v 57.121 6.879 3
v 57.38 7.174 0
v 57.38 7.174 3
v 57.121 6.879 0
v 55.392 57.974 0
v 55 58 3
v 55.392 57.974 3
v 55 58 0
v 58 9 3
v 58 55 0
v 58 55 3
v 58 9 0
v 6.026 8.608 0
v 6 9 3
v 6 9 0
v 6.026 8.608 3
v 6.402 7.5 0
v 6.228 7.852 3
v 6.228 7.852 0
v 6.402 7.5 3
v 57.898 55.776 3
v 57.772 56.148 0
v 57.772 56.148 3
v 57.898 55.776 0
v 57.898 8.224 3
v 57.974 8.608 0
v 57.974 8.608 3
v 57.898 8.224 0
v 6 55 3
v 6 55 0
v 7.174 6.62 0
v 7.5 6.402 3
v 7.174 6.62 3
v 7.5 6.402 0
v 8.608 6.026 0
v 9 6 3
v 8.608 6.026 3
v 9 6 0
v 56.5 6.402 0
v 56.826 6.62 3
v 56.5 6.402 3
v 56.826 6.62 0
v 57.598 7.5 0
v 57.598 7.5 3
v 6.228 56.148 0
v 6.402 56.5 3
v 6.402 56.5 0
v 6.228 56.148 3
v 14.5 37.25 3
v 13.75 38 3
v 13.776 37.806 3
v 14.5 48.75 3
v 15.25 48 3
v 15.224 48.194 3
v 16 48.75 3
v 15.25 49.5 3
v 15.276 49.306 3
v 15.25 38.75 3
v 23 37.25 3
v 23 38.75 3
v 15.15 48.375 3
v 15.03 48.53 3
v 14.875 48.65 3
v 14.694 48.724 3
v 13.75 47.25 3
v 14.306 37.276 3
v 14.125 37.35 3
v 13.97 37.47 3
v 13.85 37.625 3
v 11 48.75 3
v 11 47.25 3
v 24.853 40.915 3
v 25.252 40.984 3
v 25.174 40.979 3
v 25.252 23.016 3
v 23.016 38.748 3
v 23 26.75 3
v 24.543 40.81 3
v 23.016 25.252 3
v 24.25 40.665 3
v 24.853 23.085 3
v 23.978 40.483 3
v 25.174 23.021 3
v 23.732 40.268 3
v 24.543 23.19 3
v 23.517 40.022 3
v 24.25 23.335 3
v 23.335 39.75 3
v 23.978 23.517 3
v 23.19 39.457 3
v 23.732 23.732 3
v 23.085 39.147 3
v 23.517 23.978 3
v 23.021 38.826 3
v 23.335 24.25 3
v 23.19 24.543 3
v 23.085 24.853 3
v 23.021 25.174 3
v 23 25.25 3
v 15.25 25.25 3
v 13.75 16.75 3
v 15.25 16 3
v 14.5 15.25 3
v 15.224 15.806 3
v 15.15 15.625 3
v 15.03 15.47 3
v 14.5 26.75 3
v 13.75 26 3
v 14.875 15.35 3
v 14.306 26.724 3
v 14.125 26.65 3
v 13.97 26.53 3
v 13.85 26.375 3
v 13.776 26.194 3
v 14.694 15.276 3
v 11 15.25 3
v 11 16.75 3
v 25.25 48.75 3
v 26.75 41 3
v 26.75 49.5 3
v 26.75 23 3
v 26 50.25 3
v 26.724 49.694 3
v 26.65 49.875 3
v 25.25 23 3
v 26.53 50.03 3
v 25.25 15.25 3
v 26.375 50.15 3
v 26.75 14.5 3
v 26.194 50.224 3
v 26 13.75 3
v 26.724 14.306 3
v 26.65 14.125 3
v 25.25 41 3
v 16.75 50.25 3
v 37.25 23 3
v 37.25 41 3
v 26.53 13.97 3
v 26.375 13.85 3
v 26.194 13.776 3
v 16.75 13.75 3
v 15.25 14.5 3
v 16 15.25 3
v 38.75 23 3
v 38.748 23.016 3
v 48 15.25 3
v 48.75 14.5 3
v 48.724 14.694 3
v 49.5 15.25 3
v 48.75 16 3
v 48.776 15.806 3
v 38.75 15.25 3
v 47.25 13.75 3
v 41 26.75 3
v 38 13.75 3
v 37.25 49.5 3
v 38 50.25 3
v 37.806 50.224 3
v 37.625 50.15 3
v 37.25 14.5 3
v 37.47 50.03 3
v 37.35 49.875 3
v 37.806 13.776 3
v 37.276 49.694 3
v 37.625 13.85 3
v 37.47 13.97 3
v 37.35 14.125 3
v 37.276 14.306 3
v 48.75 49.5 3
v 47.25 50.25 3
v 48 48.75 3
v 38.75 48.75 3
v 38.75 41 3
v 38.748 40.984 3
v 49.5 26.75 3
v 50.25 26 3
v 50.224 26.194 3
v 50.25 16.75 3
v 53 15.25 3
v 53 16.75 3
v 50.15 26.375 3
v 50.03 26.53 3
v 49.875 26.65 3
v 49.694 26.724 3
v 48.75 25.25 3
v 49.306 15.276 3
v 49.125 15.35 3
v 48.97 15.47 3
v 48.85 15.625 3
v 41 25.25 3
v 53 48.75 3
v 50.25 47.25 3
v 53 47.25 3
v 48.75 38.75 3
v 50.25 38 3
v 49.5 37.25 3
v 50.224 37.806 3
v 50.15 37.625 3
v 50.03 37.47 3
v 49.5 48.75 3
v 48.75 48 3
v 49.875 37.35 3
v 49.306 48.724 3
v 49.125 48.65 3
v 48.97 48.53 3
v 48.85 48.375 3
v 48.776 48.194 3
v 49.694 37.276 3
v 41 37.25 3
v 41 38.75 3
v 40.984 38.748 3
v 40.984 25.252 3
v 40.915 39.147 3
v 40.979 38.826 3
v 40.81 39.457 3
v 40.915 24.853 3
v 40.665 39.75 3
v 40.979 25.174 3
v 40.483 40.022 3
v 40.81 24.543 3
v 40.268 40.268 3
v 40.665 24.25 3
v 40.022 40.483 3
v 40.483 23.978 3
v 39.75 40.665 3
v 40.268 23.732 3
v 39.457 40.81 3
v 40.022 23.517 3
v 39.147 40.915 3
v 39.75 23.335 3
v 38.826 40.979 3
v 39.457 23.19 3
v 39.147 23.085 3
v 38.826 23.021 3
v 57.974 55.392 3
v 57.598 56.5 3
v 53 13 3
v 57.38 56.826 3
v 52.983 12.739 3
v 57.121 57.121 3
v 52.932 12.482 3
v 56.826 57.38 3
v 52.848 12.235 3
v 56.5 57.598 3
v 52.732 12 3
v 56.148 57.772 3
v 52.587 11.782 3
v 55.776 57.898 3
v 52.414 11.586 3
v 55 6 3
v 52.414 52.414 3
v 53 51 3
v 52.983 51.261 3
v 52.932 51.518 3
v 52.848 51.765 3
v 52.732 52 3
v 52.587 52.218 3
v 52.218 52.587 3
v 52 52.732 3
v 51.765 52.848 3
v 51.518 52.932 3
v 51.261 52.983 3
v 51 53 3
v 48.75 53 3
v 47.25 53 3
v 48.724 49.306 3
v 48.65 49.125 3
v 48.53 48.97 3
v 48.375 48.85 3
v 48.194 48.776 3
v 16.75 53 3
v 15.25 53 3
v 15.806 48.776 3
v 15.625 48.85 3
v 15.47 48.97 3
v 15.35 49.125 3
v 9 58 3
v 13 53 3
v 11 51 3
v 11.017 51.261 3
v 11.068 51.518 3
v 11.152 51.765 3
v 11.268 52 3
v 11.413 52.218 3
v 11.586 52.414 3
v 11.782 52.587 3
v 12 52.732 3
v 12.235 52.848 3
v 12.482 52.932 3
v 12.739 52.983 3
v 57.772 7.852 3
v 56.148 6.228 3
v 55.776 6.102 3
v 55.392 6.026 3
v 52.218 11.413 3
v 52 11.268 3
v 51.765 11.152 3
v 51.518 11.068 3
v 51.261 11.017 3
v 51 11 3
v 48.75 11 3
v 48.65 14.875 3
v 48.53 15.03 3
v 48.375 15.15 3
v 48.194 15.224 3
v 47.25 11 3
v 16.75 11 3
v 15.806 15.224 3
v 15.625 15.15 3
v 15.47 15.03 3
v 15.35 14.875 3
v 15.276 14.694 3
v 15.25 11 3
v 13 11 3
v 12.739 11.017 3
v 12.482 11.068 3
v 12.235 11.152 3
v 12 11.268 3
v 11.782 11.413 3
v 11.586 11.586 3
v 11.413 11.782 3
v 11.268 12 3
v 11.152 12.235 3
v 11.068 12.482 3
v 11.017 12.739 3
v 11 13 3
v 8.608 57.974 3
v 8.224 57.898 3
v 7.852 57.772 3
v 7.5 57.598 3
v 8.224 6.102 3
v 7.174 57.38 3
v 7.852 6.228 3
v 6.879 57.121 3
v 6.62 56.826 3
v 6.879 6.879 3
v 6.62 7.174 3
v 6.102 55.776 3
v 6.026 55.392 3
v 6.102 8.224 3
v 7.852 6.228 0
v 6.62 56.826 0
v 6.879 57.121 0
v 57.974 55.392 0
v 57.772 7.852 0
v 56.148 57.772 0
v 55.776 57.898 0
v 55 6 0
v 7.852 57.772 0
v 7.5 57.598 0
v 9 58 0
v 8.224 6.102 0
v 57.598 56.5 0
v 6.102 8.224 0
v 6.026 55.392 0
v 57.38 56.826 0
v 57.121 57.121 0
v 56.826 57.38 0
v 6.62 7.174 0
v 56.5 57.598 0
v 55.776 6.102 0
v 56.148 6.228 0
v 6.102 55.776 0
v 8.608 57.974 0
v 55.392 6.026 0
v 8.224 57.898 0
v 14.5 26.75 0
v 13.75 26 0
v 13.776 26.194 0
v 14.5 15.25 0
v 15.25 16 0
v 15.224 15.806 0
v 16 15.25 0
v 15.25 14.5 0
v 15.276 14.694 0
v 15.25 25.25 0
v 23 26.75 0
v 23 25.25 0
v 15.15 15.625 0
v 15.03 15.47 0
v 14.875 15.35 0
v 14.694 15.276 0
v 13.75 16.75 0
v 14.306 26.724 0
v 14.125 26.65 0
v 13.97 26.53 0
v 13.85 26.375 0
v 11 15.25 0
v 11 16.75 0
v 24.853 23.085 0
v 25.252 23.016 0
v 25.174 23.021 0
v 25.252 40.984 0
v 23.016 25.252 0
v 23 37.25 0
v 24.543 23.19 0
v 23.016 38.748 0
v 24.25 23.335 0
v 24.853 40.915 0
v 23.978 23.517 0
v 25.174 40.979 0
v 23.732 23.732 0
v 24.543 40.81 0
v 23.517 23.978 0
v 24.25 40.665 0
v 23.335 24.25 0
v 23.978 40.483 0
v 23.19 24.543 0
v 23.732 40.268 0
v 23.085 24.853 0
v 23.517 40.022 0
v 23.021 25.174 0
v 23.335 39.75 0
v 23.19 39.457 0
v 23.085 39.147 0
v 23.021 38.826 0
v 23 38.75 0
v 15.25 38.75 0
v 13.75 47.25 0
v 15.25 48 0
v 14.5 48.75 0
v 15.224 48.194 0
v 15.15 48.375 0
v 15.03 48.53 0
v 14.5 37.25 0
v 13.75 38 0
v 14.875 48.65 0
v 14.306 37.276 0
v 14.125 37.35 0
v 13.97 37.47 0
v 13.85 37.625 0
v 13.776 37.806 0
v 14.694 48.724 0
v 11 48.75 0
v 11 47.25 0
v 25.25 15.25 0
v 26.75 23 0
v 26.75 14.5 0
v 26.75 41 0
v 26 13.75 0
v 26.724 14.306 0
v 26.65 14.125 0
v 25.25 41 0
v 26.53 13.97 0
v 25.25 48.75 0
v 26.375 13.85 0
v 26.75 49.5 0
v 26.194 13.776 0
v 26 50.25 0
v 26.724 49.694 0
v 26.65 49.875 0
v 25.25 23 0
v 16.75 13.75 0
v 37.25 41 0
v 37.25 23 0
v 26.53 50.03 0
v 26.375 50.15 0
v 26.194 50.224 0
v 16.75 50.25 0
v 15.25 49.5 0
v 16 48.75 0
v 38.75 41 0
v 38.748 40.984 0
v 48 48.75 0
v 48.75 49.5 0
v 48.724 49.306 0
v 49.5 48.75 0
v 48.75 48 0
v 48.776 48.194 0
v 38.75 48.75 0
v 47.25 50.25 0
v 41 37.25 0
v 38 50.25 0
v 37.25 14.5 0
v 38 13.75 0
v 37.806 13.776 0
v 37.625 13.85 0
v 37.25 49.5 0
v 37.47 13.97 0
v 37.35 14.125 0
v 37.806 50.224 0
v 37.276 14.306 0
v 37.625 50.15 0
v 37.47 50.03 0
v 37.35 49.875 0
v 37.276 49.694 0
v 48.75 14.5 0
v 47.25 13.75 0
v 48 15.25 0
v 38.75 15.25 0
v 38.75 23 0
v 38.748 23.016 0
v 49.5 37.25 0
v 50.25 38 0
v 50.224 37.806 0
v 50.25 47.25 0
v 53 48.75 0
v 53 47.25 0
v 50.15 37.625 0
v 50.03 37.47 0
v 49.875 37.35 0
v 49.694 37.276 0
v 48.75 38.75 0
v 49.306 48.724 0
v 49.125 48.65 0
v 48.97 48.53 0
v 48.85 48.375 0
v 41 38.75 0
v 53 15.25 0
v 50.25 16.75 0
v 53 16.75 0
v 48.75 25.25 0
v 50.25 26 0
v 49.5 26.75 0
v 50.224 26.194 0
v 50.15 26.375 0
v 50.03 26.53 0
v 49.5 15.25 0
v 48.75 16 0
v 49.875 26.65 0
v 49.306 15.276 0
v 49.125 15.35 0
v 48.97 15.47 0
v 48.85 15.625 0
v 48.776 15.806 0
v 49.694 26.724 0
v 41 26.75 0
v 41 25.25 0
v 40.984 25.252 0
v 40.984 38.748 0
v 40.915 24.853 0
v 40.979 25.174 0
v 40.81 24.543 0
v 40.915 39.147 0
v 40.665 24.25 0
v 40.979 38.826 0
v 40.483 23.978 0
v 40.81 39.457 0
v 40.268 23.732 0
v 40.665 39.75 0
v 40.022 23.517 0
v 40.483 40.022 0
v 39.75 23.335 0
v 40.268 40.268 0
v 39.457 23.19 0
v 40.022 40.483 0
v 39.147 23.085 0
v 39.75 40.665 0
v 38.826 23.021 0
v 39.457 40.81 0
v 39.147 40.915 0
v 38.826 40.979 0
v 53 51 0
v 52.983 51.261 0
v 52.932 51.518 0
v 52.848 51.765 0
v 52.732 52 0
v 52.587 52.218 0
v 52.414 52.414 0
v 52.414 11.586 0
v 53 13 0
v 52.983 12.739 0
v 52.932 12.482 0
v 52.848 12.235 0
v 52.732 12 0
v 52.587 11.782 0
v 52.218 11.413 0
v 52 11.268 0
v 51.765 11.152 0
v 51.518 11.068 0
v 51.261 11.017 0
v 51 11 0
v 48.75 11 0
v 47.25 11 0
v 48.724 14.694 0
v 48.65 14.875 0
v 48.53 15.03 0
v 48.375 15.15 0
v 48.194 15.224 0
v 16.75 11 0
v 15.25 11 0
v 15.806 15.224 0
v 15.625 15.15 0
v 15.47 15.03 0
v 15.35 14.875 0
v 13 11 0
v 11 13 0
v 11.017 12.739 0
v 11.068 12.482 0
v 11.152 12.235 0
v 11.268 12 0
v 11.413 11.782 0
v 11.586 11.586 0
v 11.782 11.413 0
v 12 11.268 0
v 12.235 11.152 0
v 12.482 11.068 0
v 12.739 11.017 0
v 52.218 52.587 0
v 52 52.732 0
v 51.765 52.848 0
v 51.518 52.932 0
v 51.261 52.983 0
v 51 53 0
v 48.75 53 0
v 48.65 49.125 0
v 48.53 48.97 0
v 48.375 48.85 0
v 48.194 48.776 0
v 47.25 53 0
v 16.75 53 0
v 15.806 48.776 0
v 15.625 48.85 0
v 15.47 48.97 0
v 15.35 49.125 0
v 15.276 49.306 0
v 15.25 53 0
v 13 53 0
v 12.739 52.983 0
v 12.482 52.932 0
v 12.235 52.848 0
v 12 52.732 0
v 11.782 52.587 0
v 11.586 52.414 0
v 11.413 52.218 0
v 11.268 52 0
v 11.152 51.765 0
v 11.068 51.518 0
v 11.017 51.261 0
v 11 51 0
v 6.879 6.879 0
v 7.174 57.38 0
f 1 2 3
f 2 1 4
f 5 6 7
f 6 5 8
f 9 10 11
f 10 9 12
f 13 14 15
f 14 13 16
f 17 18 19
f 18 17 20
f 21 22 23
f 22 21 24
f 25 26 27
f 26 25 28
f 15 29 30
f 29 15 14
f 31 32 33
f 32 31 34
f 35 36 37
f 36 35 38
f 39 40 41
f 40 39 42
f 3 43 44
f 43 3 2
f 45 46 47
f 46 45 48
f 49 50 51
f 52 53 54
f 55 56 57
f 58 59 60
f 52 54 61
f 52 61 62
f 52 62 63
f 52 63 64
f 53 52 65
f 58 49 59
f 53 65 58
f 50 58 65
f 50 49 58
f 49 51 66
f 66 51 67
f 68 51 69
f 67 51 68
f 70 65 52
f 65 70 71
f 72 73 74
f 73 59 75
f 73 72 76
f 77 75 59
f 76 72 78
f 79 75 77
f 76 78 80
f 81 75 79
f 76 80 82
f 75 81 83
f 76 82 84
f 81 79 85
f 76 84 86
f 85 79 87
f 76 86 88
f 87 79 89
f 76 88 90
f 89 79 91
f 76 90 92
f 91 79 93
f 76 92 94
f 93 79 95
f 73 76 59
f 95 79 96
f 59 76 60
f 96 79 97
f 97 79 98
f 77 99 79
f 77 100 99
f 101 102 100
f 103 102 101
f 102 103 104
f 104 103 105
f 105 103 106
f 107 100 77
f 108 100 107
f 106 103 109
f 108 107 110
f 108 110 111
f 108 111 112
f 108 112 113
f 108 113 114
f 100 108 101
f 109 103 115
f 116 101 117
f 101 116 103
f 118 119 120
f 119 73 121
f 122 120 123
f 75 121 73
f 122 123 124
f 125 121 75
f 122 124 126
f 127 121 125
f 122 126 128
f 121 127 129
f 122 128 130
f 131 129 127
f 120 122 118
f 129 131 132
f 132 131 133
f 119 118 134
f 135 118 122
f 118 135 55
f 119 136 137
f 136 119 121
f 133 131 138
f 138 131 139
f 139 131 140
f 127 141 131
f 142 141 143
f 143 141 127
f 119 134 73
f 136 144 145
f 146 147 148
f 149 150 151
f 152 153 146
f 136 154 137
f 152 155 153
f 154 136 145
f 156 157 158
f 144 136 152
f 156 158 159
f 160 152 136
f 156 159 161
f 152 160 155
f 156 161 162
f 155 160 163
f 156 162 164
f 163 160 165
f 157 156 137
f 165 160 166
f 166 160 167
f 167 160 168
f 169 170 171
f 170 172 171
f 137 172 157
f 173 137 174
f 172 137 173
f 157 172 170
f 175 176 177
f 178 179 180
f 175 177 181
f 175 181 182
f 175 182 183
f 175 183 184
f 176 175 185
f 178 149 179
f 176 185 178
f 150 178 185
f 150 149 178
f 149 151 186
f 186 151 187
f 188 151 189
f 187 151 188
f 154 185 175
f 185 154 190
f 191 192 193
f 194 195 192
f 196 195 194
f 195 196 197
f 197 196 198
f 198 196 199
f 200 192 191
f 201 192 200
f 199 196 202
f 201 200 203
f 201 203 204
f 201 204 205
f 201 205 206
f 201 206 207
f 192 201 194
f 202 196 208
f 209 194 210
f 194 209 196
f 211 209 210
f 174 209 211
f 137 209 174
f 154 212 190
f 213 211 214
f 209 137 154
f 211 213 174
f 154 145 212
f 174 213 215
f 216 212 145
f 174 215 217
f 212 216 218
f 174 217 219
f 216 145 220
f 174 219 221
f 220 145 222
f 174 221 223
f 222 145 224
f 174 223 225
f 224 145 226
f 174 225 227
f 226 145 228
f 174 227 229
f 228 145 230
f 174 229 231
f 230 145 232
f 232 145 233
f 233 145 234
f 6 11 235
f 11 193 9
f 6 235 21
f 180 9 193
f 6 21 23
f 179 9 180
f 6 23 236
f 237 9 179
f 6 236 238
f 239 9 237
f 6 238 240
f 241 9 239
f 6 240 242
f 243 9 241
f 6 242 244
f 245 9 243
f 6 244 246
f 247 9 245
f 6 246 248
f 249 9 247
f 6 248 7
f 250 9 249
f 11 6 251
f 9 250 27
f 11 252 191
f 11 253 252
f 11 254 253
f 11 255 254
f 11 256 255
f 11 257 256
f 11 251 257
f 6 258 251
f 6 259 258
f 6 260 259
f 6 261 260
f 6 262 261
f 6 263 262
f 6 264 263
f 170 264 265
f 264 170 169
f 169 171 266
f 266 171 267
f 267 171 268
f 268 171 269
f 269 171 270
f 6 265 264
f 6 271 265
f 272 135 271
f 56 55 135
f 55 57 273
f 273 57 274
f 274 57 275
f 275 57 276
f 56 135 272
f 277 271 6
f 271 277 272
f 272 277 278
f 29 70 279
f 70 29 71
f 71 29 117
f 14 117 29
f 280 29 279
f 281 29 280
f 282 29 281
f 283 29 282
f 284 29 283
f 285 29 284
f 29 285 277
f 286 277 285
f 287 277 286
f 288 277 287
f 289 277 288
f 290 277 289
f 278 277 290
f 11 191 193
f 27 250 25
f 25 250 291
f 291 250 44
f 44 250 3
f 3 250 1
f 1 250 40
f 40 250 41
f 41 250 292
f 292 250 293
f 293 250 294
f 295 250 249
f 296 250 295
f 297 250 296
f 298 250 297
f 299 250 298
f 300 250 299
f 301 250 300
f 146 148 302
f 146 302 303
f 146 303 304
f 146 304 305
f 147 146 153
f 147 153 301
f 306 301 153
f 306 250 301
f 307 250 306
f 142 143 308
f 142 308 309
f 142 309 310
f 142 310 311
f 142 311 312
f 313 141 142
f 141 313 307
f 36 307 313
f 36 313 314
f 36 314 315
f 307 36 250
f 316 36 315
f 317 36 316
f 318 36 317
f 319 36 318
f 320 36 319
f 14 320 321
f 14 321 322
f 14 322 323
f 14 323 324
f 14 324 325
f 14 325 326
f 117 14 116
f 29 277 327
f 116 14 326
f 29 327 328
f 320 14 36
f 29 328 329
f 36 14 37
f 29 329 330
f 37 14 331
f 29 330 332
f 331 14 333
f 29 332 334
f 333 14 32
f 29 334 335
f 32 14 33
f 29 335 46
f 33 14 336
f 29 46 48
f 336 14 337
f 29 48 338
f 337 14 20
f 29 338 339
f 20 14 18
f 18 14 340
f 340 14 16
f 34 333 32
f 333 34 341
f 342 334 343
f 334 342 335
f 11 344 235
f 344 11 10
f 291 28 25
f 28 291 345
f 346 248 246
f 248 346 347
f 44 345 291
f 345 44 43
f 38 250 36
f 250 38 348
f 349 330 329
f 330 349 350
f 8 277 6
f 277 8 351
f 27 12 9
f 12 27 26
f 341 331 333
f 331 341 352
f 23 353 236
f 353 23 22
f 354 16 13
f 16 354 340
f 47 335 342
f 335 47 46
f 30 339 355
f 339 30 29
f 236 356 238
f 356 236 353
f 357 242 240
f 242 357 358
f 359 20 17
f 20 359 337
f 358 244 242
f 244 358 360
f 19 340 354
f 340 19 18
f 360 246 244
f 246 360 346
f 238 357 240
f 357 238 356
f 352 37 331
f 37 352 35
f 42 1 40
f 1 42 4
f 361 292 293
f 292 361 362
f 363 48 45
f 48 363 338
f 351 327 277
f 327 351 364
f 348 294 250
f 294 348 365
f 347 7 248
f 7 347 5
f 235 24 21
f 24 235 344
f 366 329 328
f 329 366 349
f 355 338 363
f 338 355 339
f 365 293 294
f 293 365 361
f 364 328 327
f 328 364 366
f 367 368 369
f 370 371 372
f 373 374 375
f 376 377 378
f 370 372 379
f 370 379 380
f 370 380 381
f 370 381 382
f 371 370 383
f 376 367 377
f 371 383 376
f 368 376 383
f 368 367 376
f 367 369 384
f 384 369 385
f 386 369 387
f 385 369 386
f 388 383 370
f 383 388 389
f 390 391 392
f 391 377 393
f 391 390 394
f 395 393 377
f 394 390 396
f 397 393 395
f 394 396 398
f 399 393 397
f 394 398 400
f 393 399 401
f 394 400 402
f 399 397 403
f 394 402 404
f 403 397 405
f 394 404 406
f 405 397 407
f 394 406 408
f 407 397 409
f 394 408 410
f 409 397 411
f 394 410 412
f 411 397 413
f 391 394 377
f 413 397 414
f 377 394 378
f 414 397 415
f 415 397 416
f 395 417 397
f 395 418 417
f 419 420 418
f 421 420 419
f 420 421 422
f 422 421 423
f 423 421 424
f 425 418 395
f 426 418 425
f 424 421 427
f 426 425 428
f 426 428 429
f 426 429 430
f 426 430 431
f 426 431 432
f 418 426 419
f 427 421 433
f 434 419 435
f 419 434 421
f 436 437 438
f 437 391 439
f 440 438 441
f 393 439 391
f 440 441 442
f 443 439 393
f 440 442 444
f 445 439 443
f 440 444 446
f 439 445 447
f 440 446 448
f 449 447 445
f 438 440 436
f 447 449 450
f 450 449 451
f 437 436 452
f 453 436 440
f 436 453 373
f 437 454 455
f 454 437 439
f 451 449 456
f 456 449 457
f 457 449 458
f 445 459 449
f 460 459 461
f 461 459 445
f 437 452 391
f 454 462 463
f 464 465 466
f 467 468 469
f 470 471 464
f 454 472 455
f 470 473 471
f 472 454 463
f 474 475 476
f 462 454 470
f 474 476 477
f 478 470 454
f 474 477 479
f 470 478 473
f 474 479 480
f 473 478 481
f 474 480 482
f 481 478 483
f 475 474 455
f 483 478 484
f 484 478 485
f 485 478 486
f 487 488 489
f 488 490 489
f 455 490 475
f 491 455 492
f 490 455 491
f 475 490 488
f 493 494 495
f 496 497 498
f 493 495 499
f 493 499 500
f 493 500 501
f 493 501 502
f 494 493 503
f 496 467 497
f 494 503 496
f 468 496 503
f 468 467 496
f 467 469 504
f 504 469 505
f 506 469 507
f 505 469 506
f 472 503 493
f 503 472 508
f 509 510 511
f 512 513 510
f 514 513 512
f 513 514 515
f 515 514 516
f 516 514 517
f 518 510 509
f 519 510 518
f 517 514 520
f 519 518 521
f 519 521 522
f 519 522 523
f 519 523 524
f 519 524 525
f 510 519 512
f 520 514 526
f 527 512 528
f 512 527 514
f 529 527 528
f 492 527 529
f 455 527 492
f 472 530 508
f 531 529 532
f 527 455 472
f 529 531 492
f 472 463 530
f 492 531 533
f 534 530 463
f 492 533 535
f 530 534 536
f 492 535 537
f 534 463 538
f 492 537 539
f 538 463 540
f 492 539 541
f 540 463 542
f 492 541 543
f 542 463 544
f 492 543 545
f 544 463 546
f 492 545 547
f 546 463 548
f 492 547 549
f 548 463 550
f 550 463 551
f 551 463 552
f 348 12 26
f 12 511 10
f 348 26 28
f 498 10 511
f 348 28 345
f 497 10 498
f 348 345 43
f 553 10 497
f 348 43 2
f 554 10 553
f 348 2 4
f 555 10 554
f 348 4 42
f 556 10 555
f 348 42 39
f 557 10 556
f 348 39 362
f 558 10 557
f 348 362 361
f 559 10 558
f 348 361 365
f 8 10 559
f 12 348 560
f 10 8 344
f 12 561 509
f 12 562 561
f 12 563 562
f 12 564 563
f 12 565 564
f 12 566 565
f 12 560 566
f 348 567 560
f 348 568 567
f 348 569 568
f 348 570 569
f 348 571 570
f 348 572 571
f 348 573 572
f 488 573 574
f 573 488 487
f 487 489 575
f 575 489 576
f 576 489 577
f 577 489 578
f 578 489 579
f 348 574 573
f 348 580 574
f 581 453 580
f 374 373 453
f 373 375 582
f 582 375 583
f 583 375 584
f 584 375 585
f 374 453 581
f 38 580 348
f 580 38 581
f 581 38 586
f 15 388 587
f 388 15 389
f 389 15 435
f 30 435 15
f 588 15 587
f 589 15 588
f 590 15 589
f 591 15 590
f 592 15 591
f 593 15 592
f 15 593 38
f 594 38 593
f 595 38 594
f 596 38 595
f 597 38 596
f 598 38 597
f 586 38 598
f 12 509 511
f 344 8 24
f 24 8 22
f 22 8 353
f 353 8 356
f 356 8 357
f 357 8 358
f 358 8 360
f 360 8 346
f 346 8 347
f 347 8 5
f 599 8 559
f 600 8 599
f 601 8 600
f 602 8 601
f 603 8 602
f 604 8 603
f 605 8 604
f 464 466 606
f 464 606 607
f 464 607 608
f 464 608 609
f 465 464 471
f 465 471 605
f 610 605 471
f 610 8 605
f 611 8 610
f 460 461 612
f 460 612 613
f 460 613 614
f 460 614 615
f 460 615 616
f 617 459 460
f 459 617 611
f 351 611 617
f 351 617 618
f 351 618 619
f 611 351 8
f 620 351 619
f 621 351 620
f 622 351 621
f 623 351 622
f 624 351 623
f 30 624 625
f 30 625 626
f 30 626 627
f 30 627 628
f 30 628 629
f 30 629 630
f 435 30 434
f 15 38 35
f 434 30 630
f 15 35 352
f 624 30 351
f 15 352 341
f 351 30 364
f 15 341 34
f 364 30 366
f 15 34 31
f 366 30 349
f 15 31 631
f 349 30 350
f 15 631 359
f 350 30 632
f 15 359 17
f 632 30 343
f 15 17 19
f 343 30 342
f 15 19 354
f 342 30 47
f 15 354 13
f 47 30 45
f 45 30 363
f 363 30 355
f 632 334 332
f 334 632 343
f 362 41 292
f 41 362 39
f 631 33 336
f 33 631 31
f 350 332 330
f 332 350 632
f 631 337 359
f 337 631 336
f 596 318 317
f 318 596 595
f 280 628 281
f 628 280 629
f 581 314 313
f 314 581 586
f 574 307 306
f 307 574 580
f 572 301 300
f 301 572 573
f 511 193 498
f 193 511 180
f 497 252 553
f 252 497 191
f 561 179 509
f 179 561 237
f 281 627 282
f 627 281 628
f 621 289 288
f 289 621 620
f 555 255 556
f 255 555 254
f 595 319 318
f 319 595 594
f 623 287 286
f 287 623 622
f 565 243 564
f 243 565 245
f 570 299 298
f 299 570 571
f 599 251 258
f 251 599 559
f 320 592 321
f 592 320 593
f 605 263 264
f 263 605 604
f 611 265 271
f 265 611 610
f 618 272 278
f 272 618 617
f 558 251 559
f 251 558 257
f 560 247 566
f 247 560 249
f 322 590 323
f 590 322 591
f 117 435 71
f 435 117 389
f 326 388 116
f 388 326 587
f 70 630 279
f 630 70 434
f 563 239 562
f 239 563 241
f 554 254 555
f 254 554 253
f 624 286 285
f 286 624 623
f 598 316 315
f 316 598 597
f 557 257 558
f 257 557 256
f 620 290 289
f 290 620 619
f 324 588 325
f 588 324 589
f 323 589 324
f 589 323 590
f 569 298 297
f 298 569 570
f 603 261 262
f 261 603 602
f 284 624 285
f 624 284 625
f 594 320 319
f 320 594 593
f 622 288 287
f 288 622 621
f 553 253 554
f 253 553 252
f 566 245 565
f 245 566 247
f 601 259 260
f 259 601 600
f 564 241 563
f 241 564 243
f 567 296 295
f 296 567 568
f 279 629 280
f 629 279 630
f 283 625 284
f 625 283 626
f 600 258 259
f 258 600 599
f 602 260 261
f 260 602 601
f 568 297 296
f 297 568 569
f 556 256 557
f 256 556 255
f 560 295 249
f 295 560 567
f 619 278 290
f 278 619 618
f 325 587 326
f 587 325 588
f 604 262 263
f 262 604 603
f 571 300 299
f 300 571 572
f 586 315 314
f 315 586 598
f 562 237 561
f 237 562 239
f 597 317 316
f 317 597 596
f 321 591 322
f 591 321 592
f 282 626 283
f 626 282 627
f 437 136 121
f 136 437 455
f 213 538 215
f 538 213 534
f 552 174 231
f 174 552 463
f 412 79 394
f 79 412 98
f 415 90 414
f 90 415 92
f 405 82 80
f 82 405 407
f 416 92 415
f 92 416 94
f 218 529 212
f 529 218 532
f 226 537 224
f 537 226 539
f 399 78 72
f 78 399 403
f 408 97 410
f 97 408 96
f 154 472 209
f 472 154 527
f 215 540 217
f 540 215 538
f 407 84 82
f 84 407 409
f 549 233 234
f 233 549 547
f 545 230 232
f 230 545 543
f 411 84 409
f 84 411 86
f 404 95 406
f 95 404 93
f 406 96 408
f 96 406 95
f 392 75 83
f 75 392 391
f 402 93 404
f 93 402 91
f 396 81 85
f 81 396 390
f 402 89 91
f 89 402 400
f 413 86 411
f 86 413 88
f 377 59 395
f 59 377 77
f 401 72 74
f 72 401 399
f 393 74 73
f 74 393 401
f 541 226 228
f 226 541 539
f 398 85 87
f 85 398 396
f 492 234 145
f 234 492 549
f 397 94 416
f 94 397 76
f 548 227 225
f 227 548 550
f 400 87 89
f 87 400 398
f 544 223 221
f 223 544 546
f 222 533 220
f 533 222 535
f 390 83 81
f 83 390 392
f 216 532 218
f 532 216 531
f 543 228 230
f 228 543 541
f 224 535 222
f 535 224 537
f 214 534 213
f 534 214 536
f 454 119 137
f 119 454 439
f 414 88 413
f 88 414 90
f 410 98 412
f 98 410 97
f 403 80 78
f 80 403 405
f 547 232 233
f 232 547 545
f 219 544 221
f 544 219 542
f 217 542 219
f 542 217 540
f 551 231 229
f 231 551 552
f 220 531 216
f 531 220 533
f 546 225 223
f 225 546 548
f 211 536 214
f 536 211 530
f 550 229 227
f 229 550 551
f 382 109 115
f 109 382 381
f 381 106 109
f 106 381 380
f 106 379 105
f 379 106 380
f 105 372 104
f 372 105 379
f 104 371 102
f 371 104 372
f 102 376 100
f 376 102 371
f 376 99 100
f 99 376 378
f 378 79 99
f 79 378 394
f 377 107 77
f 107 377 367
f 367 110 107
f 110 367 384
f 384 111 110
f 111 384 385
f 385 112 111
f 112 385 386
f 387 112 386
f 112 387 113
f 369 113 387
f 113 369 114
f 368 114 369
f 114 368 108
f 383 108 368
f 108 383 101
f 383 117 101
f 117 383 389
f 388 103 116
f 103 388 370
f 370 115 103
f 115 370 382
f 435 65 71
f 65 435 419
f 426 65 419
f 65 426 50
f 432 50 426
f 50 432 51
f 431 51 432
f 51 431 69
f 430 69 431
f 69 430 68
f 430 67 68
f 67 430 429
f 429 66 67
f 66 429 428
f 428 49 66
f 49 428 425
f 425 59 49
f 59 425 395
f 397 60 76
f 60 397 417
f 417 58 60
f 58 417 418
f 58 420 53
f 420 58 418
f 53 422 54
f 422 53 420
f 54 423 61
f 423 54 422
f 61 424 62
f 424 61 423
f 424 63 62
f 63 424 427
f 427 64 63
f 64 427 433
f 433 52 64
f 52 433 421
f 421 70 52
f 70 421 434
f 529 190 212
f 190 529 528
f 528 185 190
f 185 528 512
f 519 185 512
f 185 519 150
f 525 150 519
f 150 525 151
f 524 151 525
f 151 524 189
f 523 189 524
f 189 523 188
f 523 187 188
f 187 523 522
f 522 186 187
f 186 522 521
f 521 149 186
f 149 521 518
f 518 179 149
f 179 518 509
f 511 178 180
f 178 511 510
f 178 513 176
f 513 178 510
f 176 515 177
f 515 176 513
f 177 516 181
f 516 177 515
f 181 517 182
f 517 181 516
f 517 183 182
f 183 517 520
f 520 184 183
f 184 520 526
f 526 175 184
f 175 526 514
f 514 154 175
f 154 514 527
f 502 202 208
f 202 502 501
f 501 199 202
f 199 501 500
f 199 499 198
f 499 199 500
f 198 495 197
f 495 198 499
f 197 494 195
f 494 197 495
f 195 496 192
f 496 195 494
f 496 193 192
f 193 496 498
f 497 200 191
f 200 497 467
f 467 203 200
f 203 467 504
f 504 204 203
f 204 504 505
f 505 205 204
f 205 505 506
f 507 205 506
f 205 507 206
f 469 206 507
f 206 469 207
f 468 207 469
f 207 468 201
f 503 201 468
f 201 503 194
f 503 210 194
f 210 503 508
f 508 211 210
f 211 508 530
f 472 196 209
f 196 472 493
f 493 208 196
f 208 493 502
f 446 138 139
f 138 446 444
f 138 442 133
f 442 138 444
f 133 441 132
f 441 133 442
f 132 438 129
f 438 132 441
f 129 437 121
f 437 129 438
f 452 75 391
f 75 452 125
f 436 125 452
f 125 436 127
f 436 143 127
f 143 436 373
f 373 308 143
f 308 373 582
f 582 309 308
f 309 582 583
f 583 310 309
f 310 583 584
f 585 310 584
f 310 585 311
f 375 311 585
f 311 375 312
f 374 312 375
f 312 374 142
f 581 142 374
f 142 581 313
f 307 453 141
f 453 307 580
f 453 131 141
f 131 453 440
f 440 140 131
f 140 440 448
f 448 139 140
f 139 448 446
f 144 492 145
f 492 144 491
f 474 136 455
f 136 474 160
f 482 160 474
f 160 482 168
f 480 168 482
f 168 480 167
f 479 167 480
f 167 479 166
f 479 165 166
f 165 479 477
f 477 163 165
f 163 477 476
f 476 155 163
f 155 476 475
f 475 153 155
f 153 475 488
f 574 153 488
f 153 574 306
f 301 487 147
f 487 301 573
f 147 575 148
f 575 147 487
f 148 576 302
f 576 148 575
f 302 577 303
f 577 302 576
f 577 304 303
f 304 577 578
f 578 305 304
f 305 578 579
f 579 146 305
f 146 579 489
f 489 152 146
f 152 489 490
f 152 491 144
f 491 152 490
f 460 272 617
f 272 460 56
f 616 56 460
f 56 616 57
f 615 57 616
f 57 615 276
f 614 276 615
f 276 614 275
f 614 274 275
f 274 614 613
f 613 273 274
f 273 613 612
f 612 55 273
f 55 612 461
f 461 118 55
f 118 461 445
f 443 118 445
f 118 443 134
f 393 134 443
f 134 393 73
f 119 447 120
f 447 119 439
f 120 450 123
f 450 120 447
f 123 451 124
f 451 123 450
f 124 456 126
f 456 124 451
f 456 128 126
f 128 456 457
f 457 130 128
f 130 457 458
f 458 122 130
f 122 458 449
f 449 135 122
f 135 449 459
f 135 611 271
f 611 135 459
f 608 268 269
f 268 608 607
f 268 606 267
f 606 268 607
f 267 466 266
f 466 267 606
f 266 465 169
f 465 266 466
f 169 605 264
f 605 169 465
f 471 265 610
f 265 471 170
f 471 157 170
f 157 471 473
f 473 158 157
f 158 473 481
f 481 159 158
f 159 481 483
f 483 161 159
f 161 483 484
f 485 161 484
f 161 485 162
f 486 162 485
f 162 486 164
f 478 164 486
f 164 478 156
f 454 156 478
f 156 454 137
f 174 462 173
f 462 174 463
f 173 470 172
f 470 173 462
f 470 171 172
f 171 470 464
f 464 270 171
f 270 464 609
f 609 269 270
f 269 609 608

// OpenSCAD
/*
Sample 028: XY-Festkörpertisch — kräftig 1,5 mm
Generated from the FDM Mechanical Sample Library.
Units: millimetres.

Override examples:
  openscad -o custom.stl -D 'view="plate"' -D 'render_fn=64' model.scad
  openscad -o preview.png -D 'view="assembly"' model.scad
*/
use <../../../library/fdm_mechanisms.scad>

render_fn = is_undef(render_fn) ? 48 : render_fn;
view = is_undef(view) ? "plate" : view;
$fn = render_fn;

sample_xy_flexure_stage(
    view=view,
    beam_w=1.5,
    beam_l=17
);
